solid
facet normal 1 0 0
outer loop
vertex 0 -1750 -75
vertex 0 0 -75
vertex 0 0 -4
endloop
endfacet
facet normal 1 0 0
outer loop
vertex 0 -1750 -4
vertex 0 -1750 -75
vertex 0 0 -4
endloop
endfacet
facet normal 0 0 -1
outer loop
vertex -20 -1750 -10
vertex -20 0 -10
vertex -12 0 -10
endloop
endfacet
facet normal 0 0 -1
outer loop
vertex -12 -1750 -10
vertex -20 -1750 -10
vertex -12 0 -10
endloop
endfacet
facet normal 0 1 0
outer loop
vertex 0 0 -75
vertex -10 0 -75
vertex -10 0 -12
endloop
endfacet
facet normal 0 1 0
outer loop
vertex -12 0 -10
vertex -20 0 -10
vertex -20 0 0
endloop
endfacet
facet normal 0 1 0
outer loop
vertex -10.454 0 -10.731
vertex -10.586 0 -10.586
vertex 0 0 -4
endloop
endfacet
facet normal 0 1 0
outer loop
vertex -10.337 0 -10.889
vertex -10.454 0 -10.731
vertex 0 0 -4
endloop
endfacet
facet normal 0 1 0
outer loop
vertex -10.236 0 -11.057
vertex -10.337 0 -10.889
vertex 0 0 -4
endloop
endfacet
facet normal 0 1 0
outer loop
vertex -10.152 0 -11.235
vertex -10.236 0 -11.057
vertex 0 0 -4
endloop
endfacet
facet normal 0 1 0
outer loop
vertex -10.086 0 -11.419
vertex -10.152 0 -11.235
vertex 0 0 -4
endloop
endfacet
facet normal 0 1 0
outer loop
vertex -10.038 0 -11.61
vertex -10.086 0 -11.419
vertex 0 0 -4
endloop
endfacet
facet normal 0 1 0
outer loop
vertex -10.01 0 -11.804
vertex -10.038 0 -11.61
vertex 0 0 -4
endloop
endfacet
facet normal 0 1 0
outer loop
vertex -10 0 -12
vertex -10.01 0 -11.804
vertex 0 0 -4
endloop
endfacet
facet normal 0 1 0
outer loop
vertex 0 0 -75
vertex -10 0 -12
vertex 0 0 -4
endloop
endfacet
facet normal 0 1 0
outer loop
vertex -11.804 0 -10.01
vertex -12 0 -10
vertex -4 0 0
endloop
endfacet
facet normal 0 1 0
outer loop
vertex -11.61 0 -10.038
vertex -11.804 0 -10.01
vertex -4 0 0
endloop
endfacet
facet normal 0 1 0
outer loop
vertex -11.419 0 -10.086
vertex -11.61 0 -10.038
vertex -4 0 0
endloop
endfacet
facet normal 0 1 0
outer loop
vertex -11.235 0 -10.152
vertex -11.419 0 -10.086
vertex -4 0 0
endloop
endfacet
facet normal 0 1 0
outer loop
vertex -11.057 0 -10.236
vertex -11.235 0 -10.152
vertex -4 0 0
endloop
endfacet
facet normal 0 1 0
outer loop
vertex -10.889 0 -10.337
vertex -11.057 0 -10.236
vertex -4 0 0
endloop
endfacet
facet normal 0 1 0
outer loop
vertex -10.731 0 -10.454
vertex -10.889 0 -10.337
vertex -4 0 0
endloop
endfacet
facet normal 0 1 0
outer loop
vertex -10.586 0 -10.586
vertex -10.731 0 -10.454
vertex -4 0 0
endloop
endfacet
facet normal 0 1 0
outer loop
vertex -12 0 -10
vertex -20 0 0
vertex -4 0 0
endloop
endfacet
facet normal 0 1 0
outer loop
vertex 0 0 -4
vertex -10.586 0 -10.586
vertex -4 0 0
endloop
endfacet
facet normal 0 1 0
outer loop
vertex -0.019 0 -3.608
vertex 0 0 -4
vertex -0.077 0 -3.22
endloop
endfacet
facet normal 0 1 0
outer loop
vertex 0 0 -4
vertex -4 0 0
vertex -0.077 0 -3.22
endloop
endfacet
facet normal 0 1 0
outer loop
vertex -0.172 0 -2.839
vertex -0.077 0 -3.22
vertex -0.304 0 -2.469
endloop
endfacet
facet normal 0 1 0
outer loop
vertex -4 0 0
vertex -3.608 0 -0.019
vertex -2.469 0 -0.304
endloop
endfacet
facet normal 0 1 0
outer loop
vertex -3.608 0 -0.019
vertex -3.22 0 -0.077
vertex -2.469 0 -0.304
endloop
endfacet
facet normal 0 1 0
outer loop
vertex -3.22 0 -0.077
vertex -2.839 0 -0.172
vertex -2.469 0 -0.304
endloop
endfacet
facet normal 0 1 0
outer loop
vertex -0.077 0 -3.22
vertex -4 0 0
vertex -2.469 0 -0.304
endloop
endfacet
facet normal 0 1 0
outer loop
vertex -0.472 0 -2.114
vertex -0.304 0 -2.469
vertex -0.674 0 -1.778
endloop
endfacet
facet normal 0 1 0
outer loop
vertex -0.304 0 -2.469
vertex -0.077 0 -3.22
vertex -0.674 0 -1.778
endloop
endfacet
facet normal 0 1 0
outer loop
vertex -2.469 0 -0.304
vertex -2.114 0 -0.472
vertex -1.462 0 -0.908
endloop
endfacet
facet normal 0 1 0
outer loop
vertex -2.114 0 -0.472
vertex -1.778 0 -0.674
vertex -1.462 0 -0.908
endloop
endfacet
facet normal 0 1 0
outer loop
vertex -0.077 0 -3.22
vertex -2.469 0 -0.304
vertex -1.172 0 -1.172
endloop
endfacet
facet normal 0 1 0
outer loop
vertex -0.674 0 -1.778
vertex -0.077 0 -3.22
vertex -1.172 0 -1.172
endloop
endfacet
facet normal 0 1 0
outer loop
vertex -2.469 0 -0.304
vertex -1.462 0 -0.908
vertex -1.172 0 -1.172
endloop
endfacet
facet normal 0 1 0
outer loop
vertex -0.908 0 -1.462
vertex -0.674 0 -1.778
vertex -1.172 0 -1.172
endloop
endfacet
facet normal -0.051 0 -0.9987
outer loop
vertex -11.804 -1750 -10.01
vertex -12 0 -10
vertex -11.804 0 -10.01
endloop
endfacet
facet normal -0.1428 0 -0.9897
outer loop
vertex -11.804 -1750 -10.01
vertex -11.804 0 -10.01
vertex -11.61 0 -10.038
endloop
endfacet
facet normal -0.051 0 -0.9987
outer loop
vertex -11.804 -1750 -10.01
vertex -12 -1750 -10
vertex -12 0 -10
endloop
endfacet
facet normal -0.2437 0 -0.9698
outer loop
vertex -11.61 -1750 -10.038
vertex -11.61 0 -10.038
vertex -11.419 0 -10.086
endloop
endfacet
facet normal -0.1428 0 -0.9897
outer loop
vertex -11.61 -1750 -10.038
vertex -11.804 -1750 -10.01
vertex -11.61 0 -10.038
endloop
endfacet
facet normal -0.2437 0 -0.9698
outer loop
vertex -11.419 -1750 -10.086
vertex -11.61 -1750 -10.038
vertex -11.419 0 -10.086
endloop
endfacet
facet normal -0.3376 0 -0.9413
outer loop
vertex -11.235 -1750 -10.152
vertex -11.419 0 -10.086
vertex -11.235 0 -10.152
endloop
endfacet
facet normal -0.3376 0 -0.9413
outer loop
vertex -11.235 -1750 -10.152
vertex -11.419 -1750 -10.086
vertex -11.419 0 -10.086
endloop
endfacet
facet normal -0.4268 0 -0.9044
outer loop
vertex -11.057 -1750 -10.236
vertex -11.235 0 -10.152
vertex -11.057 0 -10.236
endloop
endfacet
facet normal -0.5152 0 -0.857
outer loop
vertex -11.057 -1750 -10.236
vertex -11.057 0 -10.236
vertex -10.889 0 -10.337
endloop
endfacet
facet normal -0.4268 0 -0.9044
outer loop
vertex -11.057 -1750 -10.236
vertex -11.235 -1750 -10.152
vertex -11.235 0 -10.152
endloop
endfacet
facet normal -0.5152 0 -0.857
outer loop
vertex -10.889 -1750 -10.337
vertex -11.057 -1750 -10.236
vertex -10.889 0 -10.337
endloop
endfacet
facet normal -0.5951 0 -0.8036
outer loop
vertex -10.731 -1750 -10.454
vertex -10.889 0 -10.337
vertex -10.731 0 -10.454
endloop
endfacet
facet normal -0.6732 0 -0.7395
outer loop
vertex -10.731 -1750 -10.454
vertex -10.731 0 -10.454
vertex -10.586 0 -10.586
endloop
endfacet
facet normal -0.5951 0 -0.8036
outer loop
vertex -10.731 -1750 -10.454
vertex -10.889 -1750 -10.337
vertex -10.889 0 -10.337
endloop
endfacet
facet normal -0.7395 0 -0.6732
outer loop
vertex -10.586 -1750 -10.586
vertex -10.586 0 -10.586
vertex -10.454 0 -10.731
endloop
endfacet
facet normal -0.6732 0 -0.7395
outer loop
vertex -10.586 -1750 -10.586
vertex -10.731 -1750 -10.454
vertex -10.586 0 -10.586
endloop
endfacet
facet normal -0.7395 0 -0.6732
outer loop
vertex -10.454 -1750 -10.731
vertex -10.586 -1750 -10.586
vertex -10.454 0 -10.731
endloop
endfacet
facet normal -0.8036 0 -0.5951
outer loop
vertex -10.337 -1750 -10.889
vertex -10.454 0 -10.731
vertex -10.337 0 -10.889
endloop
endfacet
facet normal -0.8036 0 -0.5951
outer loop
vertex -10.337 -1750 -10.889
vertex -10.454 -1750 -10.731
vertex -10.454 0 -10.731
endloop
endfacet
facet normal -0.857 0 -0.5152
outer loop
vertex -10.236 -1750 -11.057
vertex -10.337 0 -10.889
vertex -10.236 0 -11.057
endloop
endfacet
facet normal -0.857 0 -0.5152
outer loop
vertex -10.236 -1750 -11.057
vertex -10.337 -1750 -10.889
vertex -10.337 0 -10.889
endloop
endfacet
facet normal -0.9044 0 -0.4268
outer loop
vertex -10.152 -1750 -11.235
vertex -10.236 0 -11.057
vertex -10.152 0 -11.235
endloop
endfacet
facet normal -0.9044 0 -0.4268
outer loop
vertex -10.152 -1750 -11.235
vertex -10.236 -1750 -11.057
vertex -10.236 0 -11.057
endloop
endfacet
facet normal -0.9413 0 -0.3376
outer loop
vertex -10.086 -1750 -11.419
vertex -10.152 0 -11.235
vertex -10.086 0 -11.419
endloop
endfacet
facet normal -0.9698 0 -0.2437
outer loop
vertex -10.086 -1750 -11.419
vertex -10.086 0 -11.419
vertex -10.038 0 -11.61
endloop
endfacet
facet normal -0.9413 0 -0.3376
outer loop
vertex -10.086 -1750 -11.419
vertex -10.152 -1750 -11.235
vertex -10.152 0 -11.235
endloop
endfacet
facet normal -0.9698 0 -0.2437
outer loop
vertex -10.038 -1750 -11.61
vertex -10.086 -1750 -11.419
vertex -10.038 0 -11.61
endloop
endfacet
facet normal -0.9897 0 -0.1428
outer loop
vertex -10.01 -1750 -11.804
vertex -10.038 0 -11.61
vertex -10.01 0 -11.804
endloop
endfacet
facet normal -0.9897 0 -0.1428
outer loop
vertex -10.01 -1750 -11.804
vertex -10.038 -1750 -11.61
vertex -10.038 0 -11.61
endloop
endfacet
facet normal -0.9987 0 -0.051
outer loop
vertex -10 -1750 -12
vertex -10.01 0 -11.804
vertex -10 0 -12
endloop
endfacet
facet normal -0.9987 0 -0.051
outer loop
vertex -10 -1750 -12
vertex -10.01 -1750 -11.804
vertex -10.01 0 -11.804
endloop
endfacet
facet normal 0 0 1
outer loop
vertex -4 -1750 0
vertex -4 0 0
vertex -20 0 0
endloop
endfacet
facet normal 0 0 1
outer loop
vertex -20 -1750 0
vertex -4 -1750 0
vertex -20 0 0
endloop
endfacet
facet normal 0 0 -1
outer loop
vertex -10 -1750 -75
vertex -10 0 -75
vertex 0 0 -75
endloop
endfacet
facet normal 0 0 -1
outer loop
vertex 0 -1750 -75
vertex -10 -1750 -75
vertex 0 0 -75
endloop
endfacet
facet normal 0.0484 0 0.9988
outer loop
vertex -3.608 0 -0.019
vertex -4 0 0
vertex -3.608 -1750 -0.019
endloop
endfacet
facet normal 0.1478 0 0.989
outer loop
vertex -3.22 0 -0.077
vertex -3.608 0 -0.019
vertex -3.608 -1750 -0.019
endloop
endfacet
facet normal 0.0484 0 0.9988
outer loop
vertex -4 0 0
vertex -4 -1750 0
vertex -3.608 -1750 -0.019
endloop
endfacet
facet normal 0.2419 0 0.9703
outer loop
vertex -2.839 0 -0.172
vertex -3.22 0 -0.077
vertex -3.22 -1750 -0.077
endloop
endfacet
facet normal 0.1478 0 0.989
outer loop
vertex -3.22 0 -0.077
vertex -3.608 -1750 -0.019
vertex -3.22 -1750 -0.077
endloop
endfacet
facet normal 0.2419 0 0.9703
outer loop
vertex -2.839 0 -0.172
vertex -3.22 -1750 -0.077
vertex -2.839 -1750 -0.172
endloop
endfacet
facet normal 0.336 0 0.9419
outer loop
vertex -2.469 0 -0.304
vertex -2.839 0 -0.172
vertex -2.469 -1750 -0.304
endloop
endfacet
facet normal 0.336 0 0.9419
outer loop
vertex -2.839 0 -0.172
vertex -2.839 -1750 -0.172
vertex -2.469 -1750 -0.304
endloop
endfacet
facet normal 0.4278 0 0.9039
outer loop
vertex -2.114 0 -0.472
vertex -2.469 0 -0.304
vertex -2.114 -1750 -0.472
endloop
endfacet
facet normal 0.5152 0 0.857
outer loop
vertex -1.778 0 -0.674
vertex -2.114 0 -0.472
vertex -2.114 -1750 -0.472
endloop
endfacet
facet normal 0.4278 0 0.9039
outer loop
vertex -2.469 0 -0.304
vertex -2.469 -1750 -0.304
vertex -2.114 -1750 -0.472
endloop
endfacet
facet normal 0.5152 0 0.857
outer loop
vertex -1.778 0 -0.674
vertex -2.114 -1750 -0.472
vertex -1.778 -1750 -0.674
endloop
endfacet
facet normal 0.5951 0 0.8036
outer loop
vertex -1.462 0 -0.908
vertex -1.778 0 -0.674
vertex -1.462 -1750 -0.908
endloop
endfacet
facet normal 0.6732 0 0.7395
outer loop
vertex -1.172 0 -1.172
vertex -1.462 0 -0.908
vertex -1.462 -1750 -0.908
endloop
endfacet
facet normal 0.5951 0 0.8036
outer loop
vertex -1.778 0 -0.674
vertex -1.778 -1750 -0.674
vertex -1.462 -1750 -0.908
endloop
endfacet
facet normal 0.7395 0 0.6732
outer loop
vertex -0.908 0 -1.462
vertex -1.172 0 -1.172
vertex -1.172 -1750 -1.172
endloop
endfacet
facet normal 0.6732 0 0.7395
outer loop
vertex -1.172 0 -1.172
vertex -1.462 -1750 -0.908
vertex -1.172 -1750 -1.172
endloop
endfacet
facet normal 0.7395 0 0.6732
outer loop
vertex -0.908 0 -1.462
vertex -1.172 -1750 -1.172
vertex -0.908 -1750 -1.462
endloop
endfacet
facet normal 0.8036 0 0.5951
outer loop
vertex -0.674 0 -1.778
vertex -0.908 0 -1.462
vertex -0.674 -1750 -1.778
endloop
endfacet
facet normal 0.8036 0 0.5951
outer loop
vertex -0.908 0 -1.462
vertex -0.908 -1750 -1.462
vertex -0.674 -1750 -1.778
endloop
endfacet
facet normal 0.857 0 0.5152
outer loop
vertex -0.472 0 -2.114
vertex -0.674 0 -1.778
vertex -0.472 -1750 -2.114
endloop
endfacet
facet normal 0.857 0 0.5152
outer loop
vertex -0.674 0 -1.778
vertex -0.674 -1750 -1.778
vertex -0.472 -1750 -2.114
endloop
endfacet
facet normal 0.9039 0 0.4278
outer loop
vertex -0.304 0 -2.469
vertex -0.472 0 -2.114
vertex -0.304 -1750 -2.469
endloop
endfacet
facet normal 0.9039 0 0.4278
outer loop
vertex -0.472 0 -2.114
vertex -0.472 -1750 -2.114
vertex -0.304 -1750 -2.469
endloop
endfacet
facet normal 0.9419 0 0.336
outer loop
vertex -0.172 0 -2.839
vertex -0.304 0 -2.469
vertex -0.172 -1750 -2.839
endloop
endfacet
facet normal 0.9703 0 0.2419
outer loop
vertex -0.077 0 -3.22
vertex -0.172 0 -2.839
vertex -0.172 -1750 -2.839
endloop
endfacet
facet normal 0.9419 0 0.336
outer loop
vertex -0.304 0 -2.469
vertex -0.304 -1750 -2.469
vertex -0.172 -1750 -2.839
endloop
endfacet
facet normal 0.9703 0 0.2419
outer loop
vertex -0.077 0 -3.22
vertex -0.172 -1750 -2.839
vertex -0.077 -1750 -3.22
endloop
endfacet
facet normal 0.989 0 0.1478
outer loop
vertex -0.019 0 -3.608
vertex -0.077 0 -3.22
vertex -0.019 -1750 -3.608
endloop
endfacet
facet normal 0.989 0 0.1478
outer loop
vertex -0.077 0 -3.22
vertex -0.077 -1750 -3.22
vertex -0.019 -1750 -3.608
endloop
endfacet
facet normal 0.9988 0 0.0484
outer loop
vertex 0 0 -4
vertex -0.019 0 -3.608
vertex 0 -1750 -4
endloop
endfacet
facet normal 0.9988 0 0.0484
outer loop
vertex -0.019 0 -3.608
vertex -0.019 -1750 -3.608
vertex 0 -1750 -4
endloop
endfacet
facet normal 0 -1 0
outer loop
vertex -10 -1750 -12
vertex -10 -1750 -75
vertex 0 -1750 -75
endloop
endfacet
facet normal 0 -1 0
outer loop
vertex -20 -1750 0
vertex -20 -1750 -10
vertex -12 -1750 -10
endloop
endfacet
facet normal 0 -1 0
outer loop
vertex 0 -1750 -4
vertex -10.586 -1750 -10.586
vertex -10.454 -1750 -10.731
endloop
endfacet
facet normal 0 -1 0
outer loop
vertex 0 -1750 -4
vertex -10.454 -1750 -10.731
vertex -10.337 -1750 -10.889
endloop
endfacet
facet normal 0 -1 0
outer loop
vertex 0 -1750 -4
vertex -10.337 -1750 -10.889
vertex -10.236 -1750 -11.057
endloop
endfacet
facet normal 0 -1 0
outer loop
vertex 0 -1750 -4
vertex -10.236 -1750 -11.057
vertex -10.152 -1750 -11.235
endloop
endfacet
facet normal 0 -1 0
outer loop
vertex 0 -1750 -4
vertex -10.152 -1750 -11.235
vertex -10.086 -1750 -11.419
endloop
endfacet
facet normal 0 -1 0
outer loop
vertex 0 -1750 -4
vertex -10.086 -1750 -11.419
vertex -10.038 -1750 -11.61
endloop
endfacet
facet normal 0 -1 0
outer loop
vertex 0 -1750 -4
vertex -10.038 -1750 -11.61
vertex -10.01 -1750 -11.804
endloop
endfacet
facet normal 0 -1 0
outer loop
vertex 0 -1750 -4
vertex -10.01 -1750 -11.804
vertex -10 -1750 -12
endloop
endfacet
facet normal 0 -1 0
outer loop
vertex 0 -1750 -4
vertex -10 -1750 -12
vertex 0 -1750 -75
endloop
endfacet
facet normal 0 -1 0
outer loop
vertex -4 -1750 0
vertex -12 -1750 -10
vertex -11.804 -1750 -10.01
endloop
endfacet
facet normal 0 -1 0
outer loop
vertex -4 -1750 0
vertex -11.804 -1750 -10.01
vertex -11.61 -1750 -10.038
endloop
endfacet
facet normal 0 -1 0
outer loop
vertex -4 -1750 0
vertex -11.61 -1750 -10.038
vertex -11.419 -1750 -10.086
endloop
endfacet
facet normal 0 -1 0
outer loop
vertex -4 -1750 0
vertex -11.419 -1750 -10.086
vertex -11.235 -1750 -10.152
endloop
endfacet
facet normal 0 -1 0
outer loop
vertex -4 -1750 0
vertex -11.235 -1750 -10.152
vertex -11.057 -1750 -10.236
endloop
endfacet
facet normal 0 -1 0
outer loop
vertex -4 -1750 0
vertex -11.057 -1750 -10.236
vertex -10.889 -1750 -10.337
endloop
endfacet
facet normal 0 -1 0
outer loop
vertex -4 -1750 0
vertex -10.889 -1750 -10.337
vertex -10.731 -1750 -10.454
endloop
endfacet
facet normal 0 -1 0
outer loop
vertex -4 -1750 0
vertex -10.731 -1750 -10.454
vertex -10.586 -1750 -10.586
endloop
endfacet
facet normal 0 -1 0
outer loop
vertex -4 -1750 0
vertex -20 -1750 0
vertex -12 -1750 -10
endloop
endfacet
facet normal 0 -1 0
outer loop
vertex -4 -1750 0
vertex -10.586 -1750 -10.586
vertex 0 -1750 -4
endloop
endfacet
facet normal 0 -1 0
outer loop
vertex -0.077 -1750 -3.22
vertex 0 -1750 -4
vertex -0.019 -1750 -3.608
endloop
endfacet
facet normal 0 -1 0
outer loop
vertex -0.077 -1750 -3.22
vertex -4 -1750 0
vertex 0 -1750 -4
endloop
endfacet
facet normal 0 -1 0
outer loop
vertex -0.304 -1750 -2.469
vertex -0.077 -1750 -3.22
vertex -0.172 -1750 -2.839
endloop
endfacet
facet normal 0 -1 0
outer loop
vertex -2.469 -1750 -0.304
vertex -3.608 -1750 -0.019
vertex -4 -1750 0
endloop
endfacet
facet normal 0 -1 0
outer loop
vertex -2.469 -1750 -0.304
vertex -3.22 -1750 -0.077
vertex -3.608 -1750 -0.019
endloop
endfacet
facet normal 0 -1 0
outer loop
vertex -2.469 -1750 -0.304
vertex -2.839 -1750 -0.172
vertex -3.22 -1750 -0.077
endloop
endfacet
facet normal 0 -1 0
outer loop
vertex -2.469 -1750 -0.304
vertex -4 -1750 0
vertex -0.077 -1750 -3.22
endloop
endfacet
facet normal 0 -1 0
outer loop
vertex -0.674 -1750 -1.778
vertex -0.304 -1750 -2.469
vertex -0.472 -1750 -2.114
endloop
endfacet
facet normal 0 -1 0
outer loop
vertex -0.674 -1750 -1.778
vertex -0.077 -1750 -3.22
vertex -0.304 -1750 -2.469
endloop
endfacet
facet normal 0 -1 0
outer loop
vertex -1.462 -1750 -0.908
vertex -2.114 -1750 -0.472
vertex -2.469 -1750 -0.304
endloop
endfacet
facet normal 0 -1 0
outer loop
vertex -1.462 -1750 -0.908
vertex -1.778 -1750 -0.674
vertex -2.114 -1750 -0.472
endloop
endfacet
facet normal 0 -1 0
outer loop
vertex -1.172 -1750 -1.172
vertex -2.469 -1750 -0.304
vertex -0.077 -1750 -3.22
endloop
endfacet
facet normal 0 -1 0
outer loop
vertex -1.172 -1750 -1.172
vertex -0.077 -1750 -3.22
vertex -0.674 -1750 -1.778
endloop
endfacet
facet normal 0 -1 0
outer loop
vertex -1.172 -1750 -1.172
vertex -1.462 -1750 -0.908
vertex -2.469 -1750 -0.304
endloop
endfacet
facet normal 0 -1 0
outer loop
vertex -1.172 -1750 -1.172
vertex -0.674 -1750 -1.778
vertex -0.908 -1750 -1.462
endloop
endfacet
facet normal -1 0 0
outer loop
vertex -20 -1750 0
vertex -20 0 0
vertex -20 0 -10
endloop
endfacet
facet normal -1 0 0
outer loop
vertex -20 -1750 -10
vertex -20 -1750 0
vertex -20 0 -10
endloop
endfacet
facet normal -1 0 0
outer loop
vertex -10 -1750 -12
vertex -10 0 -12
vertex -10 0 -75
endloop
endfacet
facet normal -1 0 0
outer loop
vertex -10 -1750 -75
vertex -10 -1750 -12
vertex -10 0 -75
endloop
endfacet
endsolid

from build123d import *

# Parameters (mm, degrees)
F1_DEPTH = 1750
F2_R     = 4
F3_R     = 2


with BuildPart() as f1:
    # F0 (on Front) → F1 (new body)
    with BuildSketch(Plane.XZ):
        Polygon((0, 0), (-20, 0), (-20, -10), (-10, -10), (-10, -75), (0, -75), align=None)
    extrude(amount=F1_DEPTH)

    # F2
    f2_edges = [f1.edges().sort_by_distance(p)[0] for p in [
        (0, -875, 0),
    ]]
    fillet(f2_edges, radius=F2_R)

    # F3
    f3_edges = [f1.edges().sort_by_distance(p)[0] for p in [
        (-10, -875, -10),
    ]]
    fillet(f3_edges, radius=F3_R)


solid = f1.part
